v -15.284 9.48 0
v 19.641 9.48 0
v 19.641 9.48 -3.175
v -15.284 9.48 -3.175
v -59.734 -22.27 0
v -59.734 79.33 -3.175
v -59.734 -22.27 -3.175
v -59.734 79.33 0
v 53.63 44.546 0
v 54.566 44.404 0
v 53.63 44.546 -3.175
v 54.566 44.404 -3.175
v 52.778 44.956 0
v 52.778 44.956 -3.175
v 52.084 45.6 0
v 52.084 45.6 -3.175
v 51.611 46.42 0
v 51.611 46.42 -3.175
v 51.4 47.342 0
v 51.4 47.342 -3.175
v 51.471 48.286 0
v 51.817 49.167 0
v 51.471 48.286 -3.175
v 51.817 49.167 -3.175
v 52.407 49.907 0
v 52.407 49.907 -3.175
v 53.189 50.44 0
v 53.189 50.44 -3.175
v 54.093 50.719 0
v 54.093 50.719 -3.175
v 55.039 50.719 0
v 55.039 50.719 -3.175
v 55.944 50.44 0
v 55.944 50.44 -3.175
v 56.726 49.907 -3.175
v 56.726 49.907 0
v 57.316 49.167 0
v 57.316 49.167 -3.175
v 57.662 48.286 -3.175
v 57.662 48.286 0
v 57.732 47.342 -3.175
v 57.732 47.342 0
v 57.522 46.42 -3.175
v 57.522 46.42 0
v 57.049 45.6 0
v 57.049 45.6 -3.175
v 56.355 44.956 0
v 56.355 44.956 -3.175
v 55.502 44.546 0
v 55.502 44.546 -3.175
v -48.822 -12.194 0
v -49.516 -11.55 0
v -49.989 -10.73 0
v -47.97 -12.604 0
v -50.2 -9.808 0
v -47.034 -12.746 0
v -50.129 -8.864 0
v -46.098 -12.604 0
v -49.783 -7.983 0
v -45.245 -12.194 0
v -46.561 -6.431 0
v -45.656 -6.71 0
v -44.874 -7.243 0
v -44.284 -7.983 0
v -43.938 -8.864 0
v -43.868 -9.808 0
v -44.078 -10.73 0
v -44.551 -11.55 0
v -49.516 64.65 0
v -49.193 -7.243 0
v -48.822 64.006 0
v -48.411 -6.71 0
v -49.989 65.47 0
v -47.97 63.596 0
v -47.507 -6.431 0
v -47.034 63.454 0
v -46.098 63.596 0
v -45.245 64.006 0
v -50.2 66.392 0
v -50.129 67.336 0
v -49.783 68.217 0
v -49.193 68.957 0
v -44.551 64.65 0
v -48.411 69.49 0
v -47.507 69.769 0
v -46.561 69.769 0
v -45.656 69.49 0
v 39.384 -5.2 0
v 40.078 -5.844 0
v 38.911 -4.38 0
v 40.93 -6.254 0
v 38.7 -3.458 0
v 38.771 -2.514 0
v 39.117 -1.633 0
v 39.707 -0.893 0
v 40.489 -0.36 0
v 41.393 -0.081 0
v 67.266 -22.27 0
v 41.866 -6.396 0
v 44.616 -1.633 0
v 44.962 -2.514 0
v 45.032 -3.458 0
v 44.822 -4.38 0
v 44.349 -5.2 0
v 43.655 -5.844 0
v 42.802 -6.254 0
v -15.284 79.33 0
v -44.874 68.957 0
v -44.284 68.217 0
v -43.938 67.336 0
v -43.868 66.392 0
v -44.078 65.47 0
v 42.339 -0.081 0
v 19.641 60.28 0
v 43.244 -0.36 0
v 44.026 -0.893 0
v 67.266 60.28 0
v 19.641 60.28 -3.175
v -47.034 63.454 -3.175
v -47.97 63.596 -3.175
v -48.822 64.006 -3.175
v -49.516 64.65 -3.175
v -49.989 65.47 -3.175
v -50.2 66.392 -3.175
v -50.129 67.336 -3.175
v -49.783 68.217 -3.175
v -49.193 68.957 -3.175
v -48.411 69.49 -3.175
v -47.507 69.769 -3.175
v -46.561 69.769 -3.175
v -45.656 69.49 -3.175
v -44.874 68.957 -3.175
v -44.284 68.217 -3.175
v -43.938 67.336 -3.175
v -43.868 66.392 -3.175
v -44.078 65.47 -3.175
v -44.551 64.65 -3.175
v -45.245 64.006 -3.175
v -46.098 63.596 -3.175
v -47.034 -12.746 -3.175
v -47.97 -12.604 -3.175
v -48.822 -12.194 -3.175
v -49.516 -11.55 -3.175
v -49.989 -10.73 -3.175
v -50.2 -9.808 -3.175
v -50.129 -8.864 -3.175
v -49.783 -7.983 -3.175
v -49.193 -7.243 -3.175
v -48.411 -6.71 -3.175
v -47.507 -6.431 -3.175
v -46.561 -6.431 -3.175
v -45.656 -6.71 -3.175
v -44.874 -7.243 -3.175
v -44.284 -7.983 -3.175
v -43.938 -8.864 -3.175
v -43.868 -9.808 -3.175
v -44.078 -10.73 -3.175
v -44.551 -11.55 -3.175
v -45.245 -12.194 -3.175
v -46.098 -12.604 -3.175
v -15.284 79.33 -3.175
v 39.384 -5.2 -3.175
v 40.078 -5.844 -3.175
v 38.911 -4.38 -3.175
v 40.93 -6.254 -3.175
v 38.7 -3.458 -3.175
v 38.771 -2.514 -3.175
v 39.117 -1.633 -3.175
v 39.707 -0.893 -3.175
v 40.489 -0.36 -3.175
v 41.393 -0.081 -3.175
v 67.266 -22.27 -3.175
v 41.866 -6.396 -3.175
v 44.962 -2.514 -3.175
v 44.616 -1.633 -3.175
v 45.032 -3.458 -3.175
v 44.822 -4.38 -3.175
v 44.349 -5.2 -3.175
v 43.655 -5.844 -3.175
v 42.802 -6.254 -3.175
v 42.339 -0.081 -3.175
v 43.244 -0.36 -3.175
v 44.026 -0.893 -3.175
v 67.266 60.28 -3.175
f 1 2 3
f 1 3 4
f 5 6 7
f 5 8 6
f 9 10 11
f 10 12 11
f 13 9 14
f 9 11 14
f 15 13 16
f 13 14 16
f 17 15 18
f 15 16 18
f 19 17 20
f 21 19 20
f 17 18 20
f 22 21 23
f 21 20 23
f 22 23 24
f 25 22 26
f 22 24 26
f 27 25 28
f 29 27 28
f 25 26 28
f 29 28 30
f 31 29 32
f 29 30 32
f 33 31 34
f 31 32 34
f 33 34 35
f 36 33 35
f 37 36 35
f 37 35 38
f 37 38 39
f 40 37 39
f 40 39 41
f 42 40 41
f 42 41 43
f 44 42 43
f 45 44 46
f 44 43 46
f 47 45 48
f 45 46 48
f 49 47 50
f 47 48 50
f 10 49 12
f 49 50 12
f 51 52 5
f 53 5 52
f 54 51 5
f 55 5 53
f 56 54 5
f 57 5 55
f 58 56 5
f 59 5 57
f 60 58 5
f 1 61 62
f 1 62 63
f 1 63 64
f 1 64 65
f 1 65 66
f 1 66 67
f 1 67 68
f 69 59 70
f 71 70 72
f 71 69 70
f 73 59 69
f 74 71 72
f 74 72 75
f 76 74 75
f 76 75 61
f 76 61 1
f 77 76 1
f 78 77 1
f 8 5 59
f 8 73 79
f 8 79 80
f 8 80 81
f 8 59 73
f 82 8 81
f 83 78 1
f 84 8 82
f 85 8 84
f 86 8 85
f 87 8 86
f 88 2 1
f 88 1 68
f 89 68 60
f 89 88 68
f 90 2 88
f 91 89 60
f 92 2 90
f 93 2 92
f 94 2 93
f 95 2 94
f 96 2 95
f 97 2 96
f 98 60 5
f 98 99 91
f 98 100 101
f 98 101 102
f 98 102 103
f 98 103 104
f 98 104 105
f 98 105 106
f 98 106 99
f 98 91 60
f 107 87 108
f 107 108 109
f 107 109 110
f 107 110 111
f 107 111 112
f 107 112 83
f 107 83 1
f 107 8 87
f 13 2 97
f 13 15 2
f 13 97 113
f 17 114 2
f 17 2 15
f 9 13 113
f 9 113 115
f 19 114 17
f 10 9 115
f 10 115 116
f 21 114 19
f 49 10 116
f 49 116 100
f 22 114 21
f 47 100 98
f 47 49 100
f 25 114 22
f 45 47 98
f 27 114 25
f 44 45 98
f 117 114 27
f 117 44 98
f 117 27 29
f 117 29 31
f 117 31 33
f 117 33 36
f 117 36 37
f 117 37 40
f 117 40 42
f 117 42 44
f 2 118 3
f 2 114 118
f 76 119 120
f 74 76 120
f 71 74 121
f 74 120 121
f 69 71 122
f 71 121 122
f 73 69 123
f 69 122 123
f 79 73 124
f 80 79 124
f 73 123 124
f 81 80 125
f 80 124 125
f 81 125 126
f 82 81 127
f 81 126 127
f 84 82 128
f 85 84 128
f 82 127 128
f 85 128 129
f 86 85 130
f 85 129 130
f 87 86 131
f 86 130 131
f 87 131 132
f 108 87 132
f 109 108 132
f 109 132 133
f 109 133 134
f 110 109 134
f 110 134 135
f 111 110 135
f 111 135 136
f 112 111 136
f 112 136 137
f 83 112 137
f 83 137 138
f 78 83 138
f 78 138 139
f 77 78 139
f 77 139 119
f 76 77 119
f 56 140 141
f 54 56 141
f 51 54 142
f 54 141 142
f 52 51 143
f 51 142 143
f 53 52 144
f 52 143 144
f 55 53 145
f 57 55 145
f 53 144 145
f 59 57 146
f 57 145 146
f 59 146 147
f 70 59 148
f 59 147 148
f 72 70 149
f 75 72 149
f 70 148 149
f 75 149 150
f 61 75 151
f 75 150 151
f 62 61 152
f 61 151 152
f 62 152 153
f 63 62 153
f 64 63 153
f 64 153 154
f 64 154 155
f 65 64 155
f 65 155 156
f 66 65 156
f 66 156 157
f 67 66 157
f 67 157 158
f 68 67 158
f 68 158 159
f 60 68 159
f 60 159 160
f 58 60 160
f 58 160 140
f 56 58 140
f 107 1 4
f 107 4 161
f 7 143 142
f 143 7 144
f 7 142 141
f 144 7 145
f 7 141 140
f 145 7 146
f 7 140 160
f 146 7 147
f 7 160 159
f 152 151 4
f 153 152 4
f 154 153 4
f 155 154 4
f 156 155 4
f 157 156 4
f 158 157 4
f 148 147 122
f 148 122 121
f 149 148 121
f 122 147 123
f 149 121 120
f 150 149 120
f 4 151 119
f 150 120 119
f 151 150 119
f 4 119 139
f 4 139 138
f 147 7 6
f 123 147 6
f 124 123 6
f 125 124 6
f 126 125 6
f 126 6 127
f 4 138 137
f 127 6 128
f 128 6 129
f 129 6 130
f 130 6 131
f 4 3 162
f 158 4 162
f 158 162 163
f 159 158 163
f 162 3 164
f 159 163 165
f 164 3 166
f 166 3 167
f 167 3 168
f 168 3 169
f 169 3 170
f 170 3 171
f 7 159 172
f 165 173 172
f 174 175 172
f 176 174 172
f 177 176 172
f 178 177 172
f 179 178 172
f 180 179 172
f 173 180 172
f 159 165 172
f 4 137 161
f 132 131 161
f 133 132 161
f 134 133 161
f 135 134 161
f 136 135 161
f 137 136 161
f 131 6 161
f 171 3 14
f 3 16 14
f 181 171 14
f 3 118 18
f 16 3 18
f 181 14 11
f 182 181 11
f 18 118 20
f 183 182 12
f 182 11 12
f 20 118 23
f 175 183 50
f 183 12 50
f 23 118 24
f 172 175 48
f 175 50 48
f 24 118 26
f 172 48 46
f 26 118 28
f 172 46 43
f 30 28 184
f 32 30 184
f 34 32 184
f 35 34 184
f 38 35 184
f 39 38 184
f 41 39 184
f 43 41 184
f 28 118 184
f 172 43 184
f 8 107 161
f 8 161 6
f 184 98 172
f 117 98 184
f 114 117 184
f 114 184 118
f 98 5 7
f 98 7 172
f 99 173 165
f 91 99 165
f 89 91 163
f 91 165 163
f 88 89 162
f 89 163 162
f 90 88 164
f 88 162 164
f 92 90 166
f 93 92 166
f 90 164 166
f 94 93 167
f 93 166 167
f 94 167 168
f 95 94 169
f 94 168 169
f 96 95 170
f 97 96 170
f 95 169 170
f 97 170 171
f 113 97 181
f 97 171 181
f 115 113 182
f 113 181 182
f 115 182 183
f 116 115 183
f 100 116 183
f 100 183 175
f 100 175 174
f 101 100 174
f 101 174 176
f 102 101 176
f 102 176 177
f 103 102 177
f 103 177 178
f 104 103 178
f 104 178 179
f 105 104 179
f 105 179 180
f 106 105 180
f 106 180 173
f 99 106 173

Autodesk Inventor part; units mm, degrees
ref_plane "YZ Plane" through (0, 0, 0) normal (1, 0, 0) x (0, 1, 0)
ref_plane "XZ Plane" through (0, 0, 0) normal (0, 1, 0) x (-1, 0, 0)
ref_plane "XY Plane" through (0, 0, 0) normal (0, 0, 1) x (1, 0, 0)
sketch "Sketch1" plane through (0, 0, 0) normal (0, 0, 1) x (1, 0, 0)
  line L0 (-59.7338, 79.3295) -> (-59.7338, -22.2705)
  line L1 (-59.7338, -22.2705) -> (67.2662, -22.2705)
  line L2 (67.2662, -22.2705) -> (67.2662, 60.2795)
  line L3 (67.2662, 60.2795) -> (19.6412, 60.2795)
  line L4 (19.6412, 60.2795) -> (19.6412, 9.4795)
  line L5 (19.6412, 9.4795) -> (-15.2838, 9.4795)
  line L6 (-15.2838, 9.4795) -> (-15.2838, 79.3295)
  line L7 (-15.2838, 79.3295) -> (-59.7338, 79.3295)
  point P0 (0, 0)
  point P1 (-47.0338, 66.6295)
  point P2 (54.5662, 47.5795)
  point P3 (41.8662, -3.2205)
  point P4 (-47.0338, -9.5705)
  dimension "d0" = 101.6
  dimension "d1" = 127
  dimension "d2" = 44.45
  dimension "d3" = 47.625
  dimension "d4" = 82.55
  dimension "d5" = 69.85
  dimension "d6" = 12.7
  dimension "d7" = 12.7
  dimension "d8" = 12.7
  dimension "d9" = 12.7
  dimension "d10" = 19.05
  dimension "d11" = 25.4
  dimension "d21" = 12.7
  dimension "d22" = 12.7
extrude "Extrusion1" add sketch "Sketch1" against normal blind 3.175
hole "Hole1" at (-47.0338, 66.6295, 0) at (54.5662, 47.5795, 0) at (41.8662, -3.2205, 0) direction (0, 0, -1) diameter 6.35 depth 25.4 tip angle 118
hole "Hole2" at (-47.0338, -9.5705, 0) direction (0, 0, -1) diameter 6.35 end through all
properties part number "AS5-8-4-001"
